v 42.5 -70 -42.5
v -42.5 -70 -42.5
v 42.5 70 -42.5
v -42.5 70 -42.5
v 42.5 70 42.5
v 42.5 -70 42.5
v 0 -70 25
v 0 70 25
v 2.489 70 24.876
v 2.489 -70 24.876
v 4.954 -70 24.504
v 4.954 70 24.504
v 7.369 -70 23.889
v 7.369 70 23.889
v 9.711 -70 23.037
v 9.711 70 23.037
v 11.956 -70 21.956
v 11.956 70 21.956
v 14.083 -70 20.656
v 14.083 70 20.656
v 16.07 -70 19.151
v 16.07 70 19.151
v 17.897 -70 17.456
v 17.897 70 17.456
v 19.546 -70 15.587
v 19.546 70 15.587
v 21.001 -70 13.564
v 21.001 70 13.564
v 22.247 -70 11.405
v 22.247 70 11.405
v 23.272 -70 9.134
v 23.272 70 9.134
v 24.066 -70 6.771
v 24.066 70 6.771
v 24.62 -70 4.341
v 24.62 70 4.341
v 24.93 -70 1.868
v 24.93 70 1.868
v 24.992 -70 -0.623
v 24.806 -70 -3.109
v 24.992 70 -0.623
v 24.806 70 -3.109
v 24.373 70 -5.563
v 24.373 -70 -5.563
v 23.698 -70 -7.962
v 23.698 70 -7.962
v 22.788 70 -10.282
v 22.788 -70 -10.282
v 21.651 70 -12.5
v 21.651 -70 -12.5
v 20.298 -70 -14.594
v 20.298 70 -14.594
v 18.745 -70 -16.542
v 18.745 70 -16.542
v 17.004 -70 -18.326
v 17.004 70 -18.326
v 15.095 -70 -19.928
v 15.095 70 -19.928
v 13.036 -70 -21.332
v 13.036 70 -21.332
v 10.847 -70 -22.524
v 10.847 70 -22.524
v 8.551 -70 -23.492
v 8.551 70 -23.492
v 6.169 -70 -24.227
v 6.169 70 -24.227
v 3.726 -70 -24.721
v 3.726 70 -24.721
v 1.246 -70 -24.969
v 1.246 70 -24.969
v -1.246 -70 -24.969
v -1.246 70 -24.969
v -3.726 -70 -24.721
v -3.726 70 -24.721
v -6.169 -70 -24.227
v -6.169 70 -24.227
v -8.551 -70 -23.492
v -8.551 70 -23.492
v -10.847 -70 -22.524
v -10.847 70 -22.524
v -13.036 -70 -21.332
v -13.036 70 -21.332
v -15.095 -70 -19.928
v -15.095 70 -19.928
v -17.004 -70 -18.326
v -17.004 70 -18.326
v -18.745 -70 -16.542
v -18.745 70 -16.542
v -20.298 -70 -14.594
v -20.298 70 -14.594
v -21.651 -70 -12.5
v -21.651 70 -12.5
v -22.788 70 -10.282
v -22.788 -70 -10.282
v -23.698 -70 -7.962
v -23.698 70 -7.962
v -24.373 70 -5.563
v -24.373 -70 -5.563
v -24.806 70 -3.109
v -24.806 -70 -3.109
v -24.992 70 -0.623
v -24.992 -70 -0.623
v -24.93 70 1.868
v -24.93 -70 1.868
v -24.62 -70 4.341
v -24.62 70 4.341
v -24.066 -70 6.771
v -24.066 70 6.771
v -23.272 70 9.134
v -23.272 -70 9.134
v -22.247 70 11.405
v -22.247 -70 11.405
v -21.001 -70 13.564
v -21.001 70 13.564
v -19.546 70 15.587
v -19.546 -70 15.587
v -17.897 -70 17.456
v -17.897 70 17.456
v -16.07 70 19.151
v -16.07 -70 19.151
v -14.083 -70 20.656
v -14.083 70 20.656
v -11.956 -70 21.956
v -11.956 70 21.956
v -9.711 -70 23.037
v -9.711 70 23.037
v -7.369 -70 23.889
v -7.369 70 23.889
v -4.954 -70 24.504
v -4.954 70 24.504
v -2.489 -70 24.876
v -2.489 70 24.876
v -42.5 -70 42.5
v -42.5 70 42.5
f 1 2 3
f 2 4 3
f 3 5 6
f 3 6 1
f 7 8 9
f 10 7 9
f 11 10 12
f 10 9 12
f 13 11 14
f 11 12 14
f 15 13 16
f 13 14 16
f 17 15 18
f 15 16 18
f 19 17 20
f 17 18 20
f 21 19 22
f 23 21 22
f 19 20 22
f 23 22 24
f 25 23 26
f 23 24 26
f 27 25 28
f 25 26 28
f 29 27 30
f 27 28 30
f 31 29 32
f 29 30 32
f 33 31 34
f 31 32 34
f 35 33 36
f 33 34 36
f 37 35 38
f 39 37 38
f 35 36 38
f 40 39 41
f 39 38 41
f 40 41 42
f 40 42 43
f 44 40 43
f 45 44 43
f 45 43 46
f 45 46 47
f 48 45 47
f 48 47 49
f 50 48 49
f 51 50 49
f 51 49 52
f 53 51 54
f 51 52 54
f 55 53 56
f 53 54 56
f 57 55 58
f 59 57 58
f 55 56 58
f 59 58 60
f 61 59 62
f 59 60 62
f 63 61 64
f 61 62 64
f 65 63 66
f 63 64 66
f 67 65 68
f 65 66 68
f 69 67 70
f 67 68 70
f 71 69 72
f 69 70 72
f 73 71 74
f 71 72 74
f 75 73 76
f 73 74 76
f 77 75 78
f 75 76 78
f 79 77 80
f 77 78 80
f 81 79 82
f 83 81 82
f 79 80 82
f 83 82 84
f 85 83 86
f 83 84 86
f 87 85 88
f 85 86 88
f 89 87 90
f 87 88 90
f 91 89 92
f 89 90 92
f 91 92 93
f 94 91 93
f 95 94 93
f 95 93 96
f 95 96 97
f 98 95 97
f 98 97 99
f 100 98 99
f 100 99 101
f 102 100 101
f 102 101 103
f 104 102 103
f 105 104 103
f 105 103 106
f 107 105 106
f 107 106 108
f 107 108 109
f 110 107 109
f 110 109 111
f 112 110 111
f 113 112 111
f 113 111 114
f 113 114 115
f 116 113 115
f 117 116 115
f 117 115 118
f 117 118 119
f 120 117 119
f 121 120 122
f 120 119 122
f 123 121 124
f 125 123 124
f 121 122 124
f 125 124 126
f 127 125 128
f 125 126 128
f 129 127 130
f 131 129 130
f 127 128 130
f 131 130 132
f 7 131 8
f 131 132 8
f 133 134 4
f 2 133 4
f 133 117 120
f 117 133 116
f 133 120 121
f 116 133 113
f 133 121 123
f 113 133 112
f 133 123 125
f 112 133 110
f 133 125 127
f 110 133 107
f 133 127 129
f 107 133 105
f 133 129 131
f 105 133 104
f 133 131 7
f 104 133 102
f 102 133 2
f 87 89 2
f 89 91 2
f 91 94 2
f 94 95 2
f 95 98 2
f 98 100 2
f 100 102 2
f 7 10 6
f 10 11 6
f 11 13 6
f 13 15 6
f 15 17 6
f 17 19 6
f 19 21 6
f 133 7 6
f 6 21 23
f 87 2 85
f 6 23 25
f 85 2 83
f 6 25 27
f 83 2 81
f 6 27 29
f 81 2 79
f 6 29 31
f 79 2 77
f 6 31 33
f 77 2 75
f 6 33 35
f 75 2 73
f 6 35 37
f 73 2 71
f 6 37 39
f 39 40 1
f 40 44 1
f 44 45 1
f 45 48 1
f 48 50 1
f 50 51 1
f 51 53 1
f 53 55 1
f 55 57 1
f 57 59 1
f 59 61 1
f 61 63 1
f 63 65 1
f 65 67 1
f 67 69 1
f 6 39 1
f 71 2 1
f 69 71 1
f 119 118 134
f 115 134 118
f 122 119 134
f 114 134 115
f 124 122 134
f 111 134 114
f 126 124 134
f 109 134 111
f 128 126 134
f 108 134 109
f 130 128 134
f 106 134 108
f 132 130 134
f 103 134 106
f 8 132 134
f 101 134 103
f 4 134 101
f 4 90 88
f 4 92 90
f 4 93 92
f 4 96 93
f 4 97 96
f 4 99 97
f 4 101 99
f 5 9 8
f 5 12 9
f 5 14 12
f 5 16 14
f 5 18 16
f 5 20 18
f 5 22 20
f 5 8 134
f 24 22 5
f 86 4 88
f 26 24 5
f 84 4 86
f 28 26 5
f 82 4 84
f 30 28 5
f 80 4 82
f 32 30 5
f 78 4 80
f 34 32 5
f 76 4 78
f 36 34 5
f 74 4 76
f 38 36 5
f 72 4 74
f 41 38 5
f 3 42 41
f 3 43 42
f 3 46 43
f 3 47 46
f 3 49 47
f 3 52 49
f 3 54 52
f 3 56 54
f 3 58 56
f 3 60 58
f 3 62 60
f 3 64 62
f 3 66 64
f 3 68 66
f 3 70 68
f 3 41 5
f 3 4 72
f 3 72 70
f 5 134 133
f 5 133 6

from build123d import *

# Parameters (mm, degrees)
SKETCH_1_W          = 85
SKETCH_1_H          = 85
EXTRUDE_1_DEPTH     = 70
SKETCH_2_R          = 25
CUT_EXTRUDE_1_DEPTH = 140


with BuildPart() as part:
    # 草图1 → 凸台-拉伸1 (new, symmetric)
    with BuildSketch(Plane(origin=(0, 0, 0), x_dir=(1, 0, 0), z_dir=(0, 1, 0))):
        Rectangle(SKETCH_1_W, SKETCH_1_H)
    extrude(amount=EXTRUDE_1_DEPTH, both=True)

    # 草图2 → 切除-拉伸1 (cut)
    with BuildSketch(Plane(origin=(0, 70, 0), x_dir=(1, 0, 0), z_dir=(0, 1, 0))):
        with Locations(Location((0, 0, 0), (0, 0, 270))):
            Circle(SKETCH_2_R)
    extrude(amount=-CUT_EXTRUDE_1_DEPTH, mode=Mode.SUBTRACT)


solid = part.part
